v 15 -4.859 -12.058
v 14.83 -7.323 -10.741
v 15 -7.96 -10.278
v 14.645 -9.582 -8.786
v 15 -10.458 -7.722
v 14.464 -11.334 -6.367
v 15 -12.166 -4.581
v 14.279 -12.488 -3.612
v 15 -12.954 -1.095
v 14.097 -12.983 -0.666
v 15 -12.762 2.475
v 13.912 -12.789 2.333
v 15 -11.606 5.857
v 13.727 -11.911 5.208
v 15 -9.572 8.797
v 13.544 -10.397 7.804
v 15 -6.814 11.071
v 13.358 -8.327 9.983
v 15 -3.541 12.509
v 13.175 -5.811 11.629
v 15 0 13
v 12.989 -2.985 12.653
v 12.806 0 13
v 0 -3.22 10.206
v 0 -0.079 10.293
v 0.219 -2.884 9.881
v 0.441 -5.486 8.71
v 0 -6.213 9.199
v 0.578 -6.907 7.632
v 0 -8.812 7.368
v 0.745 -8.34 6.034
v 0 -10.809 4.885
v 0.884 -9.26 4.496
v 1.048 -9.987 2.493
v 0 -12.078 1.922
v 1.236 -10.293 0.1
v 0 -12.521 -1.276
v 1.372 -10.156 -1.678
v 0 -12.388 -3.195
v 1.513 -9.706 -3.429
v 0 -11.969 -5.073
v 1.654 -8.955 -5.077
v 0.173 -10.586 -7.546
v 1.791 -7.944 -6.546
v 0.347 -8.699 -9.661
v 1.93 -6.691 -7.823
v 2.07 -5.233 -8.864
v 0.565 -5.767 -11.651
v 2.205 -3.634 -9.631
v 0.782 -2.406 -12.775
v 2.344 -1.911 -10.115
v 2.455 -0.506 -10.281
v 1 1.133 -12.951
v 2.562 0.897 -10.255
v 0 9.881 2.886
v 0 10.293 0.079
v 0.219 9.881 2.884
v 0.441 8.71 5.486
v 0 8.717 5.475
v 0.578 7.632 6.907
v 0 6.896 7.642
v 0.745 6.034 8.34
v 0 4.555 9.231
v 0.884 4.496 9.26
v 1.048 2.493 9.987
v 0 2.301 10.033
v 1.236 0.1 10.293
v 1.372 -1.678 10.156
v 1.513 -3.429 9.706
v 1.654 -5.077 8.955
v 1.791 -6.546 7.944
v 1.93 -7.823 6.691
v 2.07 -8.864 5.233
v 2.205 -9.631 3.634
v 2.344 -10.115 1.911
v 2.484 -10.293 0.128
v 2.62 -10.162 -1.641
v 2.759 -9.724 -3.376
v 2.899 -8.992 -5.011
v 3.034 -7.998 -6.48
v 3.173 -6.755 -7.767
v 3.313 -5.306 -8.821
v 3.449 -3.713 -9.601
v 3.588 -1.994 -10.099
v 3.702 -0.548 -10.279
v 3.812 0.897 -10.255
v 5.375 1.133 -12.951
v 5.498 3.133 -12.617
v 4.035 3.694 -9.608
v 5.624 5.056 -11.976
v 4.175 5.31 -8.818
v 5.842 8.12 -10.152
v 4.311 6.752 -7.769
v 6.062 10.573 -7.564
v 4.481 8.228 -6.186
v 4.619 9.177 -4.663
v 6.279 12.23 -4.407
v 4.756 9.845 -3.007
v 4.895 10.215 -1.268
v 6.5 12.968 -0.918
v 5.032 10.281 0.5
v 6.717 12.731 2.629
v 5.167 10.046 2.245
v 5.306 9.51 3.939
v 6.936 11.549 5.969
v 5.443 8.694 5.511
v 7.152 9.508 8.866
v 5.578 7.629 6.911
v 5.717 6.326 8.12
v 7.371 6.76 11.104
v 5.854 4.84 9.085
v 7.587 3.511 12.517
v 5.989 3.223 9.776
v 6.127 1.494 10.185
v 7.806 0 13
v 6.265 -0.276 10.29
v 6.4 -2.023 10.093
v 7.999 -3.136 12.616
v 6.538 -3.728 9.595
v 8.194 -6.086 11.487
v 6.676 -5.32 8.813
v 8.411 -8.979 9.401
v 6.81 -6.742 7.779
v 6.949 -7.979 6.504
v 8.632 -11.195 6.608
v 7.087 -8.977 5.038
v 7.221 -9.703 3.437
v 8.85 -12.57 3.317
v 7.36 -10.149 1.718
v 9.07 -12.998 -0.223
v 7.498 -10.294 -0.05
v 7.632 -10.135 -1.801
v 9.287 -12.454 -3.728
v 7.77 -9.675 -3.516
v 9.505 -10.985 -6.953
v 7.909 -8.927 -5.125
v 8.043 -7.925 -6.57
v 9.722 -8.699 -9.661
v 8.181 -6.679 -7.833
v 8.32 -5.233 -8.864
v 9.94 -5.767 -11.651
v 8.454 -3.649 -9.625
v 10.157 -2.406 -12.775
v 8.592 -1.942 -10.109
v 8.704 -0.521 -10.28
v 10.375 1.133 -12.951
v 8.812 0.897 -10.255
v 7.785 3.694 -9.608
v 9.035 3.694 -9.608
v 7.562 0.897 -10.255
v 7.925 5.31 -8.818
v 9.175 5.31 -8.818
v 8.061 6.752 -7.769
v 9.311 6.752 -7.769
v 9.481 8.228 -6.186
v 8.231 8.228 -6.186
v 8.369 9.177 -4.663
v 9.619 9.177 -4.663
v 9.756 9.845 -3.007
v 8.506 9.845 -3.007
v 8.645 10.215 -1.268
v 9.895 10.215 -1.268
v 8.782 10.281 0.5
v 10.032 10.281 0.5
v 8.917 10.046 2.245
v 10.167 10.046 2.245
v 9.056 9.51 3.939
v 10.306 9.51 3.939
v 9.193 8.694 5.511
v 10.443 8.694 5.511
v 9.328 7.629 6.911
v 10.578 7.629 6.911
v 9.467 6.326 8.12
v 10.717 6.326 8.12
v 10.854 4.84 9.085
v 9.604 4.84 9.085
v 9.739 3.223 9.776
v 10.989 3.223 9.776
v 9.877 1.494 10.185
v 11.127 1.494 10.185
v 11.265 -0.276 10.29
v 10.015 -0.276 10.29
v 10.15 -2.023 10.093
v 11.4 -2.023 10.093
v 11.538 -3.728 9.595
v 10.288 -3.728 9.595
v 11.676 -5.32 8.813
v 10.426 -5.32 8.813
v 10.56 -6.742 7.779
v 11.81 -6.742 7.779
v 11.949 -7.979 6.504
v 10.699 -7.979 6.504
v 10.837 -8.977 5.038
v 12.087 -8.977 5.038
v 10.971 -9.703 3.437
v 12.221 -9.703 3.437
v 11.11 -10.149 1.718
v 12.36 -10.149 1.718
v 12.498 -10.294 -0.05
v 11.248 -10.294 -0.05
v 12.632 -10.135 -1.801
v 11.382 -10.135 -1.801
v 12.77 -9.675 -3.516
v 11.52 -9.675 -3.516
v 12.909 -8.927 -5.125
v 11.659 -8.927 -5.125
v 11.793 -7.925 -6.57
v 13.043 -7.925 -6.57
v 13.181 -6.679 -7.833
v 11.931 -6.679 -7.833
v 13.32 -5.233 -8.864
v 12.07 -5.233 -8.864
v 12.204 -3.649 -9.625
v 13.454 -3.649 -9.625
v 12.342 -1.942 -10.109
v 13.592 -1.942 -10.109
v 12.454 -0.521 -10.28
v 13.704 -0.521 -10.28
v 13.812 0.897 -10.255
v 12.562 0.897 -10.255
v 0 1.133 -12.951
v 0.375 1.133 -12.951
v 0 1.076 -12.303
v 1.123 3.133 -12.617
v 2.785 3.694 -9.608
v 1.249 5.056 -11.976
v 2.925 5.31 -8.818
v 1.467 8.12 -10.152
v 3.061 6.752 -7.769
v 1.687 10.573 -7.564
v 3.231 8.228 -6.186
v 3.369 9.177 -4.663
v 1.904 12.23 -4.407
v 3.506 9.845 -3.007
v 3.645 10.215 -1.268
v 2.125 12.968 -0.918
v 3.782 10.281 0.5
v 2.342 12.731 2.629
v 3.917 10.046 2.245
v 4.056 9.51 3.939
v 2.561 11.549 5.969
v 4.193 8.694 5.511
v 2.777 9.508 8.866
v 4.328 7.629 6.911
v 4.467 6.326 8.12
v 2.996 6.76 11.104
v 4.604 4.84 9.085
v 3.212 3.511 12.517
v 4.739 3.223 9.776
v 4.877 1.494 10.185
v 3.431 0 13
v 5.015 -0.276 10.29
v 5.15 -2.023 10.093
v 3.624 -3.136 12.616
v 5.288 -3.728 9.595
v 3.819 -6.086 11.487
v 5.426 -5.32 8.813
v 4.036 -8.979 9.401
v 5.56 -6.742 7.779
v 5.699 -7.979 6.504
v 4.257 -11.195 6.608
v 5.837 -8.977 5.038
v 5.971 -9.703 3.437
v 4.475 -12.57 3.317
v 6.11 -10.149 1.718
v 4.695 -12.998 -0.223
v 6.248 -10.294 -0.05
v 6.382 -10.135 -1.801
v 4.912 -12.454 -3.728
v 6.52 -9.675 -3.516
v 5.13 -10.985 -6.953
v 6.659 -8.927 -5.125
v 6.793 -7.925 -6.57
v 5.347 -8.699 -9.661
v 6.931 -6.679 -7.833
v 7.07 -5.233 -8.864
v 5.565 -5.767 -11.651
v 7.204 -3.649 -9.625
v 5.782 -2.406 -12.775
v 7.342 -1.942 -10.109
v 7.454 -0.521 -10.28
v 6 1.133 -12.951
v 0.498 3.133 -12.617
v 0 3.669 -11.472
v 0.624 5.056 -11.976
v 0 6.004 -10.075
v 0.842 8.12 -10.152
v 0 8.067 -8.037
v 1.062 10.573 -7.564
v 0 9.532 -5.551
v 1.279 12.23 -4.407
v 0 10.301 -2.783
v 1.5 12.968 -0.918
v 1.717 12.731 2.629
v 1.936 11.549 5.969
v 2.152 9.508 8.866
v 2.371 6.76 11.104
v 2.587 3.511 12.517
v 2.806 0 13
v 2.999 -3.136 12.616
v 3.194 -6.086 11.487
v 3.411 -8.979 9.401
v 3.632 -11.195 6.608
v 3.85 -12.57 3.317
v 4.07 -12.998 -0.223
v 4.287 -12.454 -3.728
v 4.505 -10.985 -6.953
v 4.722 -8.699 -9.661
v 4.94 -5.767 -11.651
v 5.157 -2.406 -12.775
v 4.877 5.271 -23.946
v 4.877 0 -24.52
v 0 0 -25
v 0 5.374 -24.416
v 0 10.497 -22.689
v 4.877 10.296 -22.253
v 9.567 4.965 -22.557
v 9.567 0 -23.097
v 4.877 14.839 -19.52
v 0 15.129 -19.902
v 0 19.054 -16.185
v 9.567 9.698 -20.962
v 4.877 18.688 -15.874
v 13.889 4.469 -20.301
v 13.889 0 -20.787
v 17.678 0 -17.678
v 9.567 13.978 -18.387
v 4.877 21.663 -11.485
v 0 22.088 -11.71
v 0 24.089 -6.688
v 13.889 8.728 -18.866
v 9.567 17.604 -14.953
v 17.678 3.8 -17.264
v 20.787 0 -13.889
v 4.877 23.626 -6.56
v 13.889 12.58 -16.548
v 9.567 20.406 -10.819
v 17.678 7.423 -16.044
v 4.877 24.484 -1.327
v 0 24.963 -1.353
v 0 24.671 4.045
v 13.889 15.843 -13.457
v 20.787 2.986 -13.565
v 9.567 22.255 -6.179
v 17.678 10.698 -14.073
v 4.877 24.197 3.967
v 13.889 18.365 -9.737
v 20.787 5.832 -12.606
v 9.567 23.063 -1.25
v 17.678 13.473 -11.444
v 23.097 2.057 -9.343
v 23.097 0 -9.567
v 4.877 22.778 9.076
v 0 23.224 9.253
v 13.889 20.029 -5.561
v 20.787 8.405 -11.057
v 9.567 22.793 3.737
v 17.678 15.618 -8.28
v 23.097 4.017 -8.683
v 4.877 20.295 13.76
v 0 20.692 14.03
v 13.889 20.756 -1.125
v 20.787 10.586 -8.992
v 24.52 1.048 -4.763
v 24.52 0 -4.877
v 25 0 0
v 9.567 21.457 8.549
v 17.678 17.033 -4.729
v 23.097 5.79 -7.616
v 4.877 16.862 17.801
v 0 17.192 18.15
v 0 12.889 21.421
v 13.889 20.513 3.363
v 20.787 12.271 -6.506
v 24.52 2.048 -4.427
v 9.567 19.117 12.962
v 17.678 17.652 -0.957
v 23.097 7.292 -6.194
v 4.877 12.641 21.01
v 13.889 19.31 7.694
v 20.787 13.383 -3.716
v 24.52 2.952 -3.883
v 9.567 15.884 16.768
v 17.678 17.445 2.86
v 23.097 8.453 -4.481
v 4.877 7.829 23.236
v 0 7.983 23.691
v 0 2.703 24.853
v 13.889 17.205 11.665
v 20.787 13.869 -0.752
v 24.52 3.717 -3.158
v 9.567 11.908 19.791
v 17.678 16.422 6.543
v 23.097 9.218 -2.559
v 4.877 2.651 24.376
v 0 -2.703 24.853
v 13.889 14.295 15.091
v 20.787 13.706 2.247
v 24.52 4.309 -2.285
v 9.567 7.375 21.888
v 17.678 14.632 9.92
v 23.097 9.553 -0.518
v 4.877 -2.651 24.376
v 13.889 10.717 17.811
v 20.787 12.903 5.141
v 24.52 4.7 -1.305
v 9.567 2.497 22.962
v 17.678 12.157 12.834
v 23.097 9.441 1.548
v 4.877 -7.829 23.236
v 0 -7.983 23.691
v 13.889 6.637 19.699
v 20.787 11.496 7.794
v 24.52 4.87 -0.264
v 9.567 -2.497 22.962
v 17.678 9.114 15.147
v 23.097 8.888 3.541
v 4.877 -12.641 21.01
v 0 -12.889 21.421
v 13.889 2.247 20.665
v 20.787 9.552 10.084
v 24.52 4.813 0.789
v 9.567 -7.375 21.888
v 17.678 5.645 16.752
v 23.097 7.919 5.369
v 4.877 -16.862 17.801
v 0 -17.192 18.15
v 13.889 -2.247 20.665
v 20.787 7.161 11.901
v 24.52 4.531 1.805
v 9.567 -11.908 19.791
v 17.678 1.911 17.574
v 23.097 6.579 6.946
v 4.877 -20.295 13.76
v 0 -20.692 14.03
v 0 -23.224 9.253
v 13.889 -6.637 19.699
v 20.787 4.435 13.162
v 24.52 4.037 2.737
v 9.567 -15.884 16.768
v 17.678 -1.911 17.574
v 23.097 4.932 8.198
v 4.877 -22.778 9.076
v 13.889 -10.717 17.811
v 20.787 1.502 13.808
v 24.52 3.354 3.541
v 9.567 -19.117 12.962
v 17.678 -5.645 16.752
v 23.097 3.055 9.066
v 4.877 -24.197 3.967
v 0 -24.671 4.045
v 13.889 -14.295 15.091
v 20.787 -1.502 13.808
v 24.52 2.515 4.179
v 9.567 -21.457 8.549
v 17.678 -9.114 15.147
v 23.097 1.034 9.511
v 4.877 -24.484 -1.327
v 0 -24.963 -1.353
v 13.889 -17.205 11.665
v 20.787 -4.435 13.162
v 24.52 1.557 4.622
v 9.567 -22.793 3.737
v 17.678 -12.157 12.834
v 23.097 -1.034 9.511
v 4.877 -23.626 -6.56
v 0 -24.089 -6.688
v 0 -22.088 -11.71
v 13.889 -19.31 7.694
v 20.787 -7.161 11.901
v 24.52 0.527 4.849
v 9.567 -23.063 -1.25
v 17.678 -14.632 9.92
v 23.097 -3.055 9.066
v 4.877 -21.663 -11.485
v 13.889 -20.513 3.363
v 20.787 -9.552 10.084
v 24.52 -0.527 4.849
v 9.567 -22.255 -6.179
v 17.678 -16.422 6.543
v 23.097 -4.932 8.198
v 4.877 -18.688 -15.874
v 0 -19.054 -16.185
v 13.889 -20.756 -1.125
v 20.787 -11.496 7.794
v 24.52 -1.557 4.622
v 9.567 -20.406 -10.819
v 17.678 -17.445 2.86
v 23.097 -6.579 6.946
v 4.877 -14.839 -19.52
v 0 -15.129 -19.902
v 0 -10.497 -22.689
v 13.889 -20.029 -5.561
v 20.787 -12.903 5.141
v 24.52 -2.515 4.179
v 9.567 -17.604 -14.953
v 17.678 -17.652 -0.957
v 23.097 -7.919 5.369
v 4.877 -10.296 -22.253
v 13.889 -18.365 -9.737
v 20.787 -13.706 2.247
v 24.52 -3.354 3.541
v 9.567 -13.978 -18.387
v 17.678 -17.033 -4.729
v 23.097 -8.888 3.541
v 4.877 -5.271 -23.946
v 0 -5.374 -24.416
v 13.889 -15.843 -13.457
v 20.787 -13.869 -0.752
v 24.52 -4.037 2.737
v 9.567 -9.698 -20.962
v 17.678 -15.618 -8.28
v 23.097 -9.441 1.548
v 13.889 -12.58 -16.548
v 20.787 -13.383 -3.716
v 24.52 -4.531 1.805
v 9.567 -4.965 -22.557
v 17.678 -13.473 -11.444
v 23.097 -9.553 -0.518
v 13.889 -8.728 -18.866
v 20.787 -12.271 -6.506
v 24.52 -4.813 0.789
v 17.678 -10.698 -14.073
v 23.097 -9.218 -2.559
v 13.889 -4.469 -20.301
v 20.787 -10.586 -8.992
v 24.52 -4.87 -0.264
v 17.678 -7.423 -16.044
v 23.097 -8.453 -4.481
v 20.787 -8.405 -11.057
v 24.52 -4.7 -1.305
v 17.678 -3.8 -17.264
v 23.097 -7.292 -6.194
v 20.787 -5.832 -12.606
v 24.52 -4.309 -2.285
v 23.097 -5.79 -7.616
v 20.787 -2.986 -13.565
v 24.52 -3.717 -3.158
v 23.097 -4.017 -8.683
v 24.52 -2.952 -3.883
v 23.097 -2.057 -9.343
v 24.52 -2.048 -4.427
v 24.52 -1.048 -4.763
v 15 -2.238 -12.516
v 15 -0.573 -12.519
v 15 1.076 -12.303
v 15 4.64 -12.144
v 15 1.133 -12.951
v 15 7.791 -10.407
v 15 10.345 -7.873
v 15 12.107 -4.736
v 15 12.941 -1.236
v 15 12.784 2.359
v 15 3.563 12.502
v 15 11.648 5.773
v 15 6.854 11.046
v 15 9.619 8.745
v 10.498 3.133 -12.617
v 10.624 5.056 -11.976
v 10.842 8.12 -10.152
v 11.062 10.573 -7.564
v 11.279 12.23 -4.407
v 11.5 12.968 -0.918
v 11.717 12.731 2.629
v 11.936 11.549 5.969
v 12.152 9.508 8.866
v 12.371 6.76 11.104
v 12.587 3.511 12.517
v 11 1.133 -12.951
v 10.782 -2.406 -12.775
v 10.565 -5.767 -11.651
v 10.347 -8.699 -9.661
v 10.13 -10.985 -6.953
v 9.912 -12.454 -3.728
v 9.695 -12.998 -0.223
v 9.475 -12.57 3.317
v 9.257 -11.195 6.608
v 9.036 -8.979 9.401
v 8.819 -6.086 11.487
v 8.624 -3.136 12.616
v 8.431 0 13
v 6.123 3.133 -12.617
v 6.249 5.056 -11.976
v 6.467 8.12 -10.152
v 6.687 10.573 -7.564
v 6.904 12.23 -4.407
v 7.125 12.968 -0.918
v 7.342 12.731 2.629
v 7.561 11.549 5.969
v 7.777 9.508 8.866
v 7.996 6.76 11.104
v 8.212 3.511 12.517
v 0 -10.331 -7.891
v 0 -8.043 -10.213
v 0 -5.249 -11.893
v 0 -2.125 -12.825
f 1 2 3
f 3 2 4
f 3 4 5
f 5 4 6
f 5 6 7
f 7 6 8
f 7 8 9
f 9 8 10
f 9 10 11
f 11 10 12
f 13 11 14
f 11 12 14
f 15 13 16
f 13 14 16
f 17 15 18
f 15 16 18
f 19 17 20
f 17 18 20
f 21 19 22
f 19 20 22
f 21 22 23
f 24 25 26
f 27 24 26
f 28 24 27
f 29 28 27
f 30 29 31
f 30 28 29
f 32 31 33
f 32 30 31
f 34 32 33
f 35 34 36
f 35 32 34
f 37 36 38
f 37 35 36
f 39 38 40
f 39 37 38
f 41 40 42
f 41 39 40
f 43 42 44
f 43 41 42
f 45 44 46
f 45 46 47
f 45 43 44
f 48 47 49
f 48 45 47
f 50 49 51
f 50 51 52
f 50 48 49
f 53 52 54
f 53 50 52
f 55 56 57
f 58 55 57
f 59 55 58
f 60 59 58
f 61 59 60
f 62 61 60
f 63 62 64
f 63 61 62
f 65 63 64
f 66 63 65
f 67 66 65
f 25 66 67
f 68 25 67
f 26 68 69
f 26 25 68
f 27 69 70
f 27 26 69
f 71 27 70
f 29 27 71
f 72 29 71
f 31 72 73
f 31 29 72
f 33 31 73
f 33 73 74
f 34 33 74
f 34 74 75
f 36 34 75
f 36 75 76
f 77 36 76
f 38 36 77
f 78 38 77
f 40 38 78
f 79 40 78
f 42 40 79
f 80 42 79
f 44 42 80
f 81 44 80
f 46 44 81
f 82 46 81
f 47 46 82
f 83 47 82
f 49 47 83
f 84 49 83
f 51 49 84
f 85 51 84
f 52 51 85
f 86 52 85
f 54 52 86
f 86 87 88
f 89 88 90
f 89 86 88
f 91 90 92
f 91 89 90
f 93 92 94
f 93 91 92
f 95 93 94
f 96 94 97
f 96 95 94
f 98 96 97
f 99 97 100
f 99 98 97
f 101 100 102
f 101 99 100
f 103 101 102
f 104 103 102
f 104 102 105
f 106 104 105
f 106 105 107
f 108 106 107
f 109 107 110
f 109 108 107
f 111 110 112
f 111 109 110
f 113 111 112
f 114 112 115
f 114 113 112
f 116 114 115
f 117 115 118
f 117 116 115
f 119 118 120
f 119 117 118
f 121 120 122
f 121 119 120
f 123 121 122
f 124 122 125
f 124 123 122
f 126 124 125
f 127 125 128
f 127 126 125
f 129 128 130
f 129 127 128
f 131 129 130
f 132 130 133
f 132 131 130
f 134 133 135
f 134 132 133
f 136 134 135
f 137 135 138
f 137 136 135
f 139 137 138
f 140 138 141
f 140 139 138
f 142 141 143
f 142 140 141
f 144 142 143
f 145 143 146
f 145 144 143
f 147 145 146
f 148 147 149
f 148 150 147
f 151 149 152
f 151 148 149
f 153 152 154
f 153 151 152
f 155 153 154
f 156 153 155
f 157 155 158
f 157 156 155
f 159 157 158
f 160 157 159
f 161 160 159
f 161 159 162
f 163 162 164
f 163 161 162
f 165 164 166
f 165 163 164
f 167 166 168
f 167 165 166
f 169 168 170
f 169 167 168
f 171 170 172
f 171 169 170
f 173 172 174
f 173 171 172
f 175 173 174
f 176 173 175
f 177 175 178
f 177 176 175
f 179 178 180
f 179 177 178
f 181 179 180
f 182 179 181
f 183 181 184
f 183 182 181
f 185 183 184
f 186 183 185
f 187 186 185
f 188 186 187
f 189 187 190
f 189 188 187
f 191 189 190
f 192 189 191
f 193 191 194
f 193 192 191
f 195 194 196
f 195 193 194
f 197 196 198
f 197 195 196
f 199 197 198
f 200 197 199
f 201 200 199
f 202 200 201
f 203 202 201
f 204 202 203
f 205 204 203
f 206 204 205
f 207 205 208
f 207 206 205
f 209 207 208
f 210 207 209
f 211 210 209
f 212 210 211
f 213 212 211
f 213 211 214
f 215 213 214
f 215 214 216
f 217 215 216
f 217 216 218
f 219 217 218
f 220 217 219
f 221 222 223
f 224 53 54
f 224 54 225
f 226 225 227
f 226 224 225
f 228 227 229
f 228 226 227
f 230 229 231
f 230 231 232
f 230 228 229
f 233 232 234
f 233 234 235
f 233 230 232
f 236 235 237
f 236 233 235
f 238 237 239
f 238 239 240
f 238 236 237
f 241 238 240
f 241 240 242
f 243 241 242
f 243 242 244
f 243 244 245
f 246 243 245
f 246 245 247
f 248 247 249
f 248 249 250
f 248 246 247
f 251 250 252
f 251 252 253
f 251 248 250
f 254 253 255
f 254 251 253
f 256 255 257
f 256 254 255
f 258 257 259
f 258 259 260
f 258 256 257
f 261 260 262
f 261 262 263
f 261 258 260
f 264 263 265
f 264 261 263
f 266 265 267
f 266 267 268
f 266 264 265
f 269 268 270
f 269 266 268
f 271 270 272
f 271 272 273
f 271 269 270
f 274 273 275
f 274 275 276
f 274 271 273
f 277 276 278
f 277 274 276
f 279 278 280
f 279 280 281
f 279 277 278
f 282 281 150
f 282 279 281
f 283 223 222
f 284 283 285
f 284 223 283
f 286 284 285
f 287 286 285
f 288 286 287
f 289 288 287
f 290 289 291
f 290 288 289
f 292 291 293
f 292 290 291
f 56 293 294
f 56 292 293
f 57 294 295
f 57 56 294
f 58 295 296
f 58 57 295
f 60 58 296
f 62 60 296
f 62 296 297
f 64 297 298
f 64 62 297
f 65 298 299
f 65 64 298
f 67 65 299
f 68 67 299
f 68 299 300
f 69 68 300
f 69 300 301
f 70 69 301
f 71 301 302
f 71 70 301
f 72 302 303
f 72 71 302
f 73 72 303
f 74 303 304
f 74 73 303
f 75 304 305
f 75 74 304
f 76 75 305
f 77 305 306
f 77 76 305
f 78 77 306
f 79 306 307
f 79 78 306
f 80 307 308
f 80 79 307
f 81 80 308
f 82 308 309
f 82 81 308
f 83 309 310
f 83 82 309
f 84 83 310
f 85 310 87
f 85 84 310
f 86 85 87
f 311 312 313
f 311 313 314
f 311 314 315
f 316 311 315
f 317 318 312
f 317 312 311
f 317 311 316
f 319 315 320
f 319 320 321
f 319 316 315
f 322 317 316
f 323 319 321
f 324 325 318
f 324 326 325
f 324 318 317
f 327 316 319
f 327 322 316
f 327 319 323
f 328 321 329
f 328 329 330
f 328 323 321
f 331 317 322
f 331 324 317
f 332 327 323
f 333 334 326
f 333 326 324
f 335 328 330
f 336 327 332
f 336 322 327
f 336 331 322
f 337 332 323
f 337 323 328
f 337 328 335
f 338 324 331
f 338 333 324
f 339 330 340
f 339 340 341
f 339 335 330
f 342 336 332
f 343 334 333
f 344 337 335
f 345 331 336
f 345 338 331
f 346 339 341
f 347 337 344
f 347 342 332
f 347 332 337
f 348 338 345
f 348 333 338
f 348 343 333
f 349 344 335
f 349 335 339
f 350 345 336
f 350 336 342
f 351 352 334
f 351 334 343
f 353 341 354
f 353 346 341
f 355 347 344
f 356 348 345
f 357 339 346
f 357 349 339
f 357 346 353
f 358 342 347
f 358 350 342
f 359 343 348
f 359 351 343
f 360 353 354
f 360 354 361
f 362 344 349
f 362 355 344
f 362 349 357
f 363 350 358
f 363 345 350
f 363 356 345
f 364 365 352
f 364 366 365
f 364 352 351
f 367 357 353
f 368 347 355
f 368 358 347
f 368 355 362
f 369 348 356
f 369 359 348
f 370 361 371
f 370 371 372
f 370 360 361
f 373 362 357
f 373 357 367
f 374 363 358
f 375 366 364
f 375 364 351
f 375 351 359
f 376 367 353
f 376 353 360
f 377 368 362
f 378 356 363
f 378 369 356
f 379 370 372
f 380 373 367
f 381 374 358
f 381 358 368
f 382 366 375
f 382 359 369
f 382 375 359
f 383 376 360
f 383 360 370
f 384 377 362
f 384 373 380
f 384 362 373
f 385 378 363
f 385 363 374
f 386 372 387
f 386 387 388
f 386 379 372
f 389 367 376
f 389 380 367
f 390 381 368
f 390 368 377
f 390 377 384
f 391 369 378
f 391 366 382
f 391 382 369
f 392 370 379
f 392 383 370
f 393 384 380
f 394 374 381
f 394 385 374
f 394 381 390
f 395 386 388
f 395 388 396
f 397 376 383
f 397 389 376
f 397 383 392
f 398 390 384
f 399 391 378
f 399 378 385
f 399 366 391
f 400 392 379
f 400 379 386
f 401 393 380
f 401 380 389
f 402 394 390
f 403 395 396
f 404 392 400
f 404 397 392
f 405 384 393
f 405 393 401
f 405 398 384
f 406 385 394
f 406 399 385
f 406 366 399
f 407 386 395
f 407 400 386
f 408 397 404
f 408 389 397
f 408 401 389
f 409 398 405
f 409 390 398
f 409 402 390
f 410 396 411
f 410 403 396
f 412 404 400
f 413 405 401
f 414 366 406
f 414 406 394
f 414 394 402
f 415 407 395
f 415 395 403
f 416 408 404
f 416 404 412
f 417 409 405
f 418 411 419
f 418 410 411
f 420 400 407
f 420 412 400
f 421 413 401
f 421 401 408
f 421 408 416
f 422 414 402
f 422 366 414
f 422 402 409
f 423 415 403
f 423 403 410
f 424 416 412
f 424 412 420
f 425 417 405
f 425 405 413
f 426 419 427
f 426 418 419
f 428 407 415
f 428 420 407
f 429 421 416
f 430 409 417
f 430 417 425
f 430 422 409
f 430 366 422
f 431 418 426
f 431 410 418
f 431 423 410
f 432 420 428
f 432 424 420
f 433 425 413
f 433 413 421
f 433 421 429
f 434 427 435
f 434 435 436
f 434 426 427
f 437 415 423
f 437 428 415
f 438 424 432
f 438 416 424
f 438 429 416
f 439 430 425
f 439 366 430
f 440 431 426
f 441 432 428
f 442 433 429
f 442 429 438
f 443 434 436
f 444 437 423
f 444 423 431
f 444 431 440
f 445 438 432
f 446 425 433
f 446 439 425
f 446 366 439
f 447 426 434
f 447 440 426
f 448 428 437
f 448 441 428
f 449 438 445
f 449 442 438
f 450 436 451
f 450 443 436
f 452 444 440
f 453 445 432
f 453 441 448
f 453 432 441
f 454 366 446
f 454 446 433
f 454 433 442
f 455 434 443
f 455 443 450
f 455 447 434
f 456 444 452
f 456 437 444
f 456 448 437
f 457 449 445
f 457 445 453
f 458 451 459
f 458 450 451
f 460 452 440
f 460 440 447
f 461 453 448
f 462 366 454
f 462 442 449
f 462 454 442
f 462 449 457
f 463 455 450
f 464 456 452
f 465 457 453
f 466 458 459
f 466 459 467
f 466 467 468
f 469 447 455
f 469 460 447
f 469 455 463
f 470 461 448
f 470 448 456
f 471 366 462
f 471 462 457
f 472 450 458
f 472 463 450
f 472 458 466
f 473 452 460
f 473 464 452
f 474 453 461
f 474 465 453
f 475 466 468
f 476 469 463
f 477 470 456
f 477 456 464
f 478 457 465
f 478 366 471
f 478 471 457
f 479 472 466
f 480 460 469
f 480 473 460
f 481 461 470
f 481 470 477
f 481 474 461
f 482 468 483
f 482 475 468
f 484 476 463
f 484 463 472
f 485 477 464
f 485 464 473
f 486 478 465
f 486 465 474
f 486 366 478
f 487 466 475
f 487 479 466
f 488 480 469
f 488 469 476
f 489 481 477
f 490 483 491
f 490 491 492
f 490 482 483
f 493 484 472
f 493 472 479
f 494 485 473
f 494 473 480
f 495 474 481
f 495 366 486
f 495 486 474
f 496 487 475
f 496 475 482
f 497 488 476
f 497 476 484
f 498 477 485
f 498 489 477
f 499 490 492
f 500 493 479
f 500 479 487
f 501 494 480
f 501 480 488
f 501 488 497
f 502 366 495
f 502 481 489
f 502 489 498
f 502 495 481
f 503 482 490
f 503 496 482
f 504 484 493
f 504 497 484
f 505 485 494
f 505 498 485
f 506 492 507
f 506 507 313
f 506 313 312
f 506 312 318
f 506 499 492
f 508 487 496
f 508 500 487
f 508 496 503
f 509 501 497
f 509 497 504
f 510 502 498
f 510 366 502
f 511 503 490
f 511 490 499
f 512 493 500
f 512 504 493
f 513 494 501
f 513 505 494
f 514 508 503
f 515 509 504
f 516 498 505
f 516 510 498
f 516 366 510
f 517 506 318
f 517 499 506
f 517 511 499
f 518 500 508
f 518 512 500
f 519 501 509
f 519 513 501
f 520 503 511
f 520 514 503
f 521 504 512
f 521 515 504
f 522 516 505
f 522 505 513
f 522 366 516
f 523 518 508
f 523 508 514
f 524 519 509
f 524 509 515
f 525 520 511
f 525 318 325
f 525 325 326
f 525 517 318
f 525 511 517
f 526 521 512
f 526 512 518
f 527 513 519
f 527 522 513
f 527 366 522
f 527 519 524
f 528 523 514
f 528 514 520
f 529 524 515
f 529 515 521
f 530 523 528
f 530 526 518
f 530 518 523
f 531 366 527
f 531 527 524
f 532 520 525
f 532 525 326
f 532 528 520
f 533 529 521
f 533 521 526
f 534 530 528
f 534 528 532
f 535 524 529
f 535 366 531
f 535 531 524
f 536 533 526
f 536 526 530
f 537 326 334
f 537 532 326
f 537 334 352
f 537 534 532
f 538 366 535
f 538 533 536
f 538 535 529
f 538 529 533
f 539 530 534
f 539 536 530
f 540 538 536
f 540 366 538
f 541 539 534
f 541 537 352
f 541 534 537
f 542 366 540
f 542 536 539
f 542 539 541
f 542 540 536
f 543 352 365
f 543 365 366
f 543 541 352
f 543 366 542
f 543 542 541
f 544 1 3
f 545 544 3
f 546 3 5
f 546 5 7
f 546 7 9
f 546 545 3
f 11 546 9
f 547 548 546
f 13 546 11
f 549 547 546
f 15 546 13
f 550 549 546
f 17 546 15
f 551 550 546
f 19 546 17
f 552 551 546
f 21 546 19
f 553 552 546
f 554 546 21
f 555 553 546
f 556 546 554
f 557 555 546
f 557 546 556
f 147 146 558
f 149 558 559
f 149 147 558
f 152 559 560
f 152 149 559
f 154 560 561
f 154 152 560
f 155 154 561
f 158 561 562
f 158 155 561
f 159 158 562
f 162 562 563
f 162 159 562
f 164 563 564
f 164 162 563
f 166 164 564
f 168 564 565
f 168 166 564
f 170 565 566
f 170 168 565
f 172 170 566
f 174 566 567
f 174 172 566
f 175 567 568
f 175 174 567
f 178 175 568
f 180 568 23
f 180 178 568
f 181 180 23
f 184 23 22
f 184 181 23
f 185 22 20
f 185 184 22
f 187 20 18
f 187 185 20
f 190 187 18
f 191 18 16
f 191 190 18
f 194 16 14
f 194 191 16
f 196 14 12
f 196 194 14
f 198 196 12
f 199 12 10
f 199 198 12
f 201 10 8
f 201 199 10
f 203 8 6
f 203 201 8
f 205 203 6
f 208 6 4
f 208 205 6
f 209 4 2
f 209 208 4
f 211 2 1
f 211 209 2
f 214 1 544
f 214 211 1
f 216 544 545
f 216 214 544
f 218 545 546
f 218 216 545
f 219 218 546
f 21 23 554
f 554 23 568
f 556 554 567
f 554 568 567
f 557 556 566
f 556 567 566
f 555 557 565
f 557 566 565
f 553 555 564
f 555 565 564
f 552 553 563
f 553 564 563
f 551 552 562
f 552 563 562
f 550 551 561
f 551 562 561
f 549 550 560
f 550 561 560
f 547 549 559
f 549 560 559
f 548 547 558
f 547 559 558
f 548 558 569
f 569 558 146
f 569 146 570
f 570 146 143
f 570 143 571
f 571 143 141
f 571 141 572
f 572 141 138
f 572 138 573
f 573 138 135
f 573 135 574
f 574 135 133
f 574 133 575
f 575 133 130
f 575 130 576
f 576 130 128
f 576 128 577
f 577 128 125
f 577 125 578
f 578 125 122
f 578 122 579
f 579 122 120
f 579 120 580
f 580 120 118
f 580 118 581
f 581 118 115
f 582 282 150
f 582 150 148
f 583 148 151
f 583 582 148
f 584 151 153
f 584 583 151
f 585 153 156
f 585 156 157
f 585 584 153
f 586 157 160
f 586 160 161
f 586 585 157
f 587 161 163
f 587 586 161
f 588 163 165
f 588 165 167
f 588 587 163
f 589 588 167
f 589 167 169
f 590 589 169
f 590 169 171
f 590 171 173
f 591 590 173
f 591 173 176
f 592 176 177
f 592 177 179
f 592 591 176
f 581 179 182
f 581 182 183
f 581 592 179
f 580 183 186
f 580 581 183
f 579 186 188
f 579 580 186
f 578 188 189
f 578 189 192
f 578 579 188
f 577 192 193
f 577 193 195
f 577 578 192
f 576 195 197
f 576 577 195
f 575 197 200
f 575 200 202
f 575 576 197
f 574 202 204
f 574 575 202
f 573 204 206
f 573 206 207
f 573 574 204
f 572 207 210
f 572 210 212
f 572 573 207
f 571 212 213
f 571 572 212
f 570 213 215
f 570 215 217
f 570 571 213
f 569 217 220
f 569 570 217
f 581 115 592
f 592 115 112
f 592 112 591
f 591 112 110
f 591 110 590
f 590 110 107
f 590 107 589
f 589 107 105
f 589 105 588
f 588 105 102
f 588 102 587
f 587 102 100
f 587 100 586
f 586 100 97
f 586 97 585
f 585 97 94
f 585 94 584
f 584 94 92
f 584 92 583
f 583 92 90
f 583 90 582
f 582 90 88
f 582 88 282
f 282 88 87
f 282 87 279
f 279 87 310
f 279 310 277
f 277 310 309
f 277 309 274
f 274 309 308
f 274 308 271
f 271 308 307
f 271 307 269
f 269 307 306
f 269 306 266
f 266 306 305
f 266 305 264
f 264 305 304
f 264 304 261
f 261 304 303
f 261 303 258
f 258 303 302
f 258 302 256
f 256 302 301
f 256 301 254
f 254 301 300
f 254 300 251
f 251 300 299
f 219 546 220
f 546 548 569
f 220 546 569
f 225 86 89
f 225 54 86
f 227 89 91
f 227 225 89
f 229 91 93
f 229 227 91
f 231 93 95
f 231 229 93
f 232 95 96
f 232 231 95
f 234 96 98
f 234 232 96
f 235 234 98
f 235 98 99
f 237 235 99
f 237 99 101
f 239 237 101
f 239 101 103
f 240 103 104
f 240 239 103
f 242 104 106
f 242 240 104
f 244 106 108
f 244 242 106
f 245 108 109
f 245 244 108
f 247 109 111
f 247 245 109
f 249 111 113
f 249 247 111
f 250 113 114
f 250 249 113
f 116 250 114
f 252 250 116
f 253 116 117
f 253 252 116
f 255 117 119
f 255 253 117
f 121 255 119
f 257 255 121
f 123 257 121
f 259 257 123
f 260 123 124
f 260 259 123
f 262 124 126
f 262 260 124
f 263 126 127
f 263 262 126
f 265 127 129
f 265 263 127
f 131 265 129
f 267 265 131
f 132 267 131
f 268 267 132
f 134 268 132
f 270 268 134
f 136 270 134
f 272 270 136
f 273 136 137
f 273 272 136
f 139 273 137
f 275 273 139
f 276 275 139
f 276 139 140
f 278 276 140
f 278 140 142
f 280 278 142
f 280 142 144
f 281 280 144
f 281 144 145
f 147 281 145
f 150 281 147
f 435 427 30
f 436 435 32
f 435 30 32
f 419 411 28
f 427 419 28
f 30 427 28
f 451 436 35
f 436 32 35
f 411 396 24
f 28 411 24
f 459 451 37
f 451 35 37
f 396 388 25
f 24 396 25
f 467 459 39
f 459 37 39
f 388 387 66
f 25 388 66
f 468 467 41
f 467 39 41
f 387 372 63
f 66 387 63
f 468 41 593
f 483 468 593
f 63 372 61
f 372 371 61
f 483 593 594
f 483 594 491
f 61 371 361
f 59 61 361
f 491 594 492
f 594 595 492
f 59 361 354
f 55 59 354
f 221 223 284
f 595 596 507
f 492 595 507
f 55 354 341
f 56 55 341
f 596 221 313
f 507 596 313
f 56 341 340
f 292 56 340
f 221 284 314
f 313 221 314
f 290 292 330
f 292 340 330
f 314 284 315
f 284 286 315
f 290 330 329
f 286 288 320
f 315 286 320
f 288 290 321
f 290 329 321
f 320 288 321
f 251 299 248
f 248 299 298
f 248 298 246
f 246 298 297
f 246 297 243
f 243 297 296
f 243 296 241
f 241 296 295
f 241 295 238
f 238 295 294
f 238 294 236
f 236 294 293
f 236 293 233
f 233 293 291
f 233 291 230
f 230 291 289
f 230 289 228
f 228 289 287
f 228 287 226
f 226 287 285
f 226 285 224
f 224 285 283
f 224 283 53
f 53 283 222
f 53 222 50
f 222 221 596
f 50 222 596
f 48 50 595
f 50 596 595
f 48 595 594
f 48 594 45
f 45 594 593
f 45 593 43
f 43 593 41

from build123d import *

# Parameters (mm, degrees)
SKETCH2_R           = 25
BOSS_EXTRUDE1_DEPTH = 25
FILLET1_R           = 25
SKETCH3_R           = 13
CUT_EXTRUDE1_DEPTH  = 15
THREAD2_PITCH       = 5
SKETCH17_W          = 32.265191549
SKETCH17_H          = 31.135556834
CUT_EXTRUDE2_DEPTH  = 70


with BuildPart() as part:
    # Sketch2 → Boss-Extrude1 (new body)
    with BuildSketch(Plane(origin=(0, 0, 0), x_dir=(0, 0, -1), z_dir=(1, 0, 0))):
        Circle(SKETCH2_R)
    extrude(amount=BOSS_EXTRUDE1_DEPTH)

    # Fillet1
    fillet1_edges = [part.edges().sort_by_distance(p)[0] for p in [
        (25, 0, 25),
    ]]
    fillet(fillet1_edges, radius=FILLET1_R - 0.0001)  # a hair under: the kernel refuses the full size

    # Sketch3 → Cut-Extrude1 (cut)
    with BuildSketch(Plane.ZY):
        Circle(SKETCH3_R)
    extrude(amount=-CUT_EXTRUDE1_DEPTH, mode=Mode.SUBTRACT)

    # Thread2: the profile of Thread Profile3 profile screwed along a right-hand helix of 3 turns, 12 arcs to a turn; built about Z, then put on its axis
    thread2_z = Axis((0, 0, 0), (0, 0, 1))
    thread2_corners = [(13.0003, -3e-09, -0.000173205), (13.0003, -3e-09, 4.375173191), (10.293670625, -3e-09, 2.812499993), (10.293670625, -3e-09, 1.562499993)]
    with BuildLine(mode=Mode.PRIVATE) as thread2_profile:
        Line(thread2_corners[0], thread2_corners[1])
        Line(thread2_corners[1], thread2_corners[2])
        Line(thread2_corners[2], thread2_corners[3])
        Line(thread2_corners[3], thread2_corners[0])
    thread2_cap = Face(thread2_profile.wire())
    thread2_turn_angles = [0, 15, 30, 45, 60, 75, 90, 105, 120, 135, 150, 165, 180, 195, 210, 225, 240, 255, 270, 285, 300, 315, 330, 345, 360]
    thread2_turn_weights = [1, 0.9659258262890683, 1, 0.9659258262890683, 1, 0.9659258262890683, 1, 0.9659258262890683, 1, 0.9659258262890683, 1, 0.9659258262890683, 1, 0.9659258262890683, 1, 0.9659258262890683, 1, 0.9659258262890683, 1, 0.9659258262890683, 1, 0.9659258262890683, 1, 0.9659258262890683, 1]
    thread2_turn_rails = [Edge.make_bspline([Vector(p[0], p[1], 0).rotate(thread2_z, thread2_turn_angles[k]) / thread2_turn_weights[k] + Vector(0, 0, p[2] + THREAD2_PITCH * thread2_turn_angles[k] / 360) for k in range(25)], [0, 0, 0, 1, 1, 2, 2, 3, 3, 4, 4, 5, 5, 6, 6, 7, 7, 8, 8, 9, 9, 10, 10, 11, 11, 12, 12, 12], 2, thread2_turn_weights) for p in thread2_corners]
    thread2_turn_sides = [Face.make_surface_from_curves(thread2_turn_rails[p[0]], thread2_turn_rails[p[1]]) for p in [(0, 1), (1, 2), (2, 3), (3, 0)]]
    thread2 = Plane(origin=(-4, 0, 0), x_dir=(0, 0.087155743, -0.996194698), z_dir=(1, 0, 0)) * Solid(Shell([*[p.moved(Location((0, 0, THREAD2_PITCH * i))) for i in range(3) for p in thread2_turn_sides], thread2_cap, thread2_cap.rotate(thread2_z, 1080).moved(Location((0, 0, THREAD2_PITCH * 1080 / 360)))]))
    add(thread2)

    # Sketch17 → Cut-Extrude2 (cut)
    with BuildSketch(Plane.ZY):
        with Locations((0.529516272, -0.282408679)):
            Rectangle(SKETCH17_W, SKETCH17_H)
    extrude(amount=CUT_EXTRUDE2_DEPTH, mode=Mode.SUBTRACT)


solid = part.part
